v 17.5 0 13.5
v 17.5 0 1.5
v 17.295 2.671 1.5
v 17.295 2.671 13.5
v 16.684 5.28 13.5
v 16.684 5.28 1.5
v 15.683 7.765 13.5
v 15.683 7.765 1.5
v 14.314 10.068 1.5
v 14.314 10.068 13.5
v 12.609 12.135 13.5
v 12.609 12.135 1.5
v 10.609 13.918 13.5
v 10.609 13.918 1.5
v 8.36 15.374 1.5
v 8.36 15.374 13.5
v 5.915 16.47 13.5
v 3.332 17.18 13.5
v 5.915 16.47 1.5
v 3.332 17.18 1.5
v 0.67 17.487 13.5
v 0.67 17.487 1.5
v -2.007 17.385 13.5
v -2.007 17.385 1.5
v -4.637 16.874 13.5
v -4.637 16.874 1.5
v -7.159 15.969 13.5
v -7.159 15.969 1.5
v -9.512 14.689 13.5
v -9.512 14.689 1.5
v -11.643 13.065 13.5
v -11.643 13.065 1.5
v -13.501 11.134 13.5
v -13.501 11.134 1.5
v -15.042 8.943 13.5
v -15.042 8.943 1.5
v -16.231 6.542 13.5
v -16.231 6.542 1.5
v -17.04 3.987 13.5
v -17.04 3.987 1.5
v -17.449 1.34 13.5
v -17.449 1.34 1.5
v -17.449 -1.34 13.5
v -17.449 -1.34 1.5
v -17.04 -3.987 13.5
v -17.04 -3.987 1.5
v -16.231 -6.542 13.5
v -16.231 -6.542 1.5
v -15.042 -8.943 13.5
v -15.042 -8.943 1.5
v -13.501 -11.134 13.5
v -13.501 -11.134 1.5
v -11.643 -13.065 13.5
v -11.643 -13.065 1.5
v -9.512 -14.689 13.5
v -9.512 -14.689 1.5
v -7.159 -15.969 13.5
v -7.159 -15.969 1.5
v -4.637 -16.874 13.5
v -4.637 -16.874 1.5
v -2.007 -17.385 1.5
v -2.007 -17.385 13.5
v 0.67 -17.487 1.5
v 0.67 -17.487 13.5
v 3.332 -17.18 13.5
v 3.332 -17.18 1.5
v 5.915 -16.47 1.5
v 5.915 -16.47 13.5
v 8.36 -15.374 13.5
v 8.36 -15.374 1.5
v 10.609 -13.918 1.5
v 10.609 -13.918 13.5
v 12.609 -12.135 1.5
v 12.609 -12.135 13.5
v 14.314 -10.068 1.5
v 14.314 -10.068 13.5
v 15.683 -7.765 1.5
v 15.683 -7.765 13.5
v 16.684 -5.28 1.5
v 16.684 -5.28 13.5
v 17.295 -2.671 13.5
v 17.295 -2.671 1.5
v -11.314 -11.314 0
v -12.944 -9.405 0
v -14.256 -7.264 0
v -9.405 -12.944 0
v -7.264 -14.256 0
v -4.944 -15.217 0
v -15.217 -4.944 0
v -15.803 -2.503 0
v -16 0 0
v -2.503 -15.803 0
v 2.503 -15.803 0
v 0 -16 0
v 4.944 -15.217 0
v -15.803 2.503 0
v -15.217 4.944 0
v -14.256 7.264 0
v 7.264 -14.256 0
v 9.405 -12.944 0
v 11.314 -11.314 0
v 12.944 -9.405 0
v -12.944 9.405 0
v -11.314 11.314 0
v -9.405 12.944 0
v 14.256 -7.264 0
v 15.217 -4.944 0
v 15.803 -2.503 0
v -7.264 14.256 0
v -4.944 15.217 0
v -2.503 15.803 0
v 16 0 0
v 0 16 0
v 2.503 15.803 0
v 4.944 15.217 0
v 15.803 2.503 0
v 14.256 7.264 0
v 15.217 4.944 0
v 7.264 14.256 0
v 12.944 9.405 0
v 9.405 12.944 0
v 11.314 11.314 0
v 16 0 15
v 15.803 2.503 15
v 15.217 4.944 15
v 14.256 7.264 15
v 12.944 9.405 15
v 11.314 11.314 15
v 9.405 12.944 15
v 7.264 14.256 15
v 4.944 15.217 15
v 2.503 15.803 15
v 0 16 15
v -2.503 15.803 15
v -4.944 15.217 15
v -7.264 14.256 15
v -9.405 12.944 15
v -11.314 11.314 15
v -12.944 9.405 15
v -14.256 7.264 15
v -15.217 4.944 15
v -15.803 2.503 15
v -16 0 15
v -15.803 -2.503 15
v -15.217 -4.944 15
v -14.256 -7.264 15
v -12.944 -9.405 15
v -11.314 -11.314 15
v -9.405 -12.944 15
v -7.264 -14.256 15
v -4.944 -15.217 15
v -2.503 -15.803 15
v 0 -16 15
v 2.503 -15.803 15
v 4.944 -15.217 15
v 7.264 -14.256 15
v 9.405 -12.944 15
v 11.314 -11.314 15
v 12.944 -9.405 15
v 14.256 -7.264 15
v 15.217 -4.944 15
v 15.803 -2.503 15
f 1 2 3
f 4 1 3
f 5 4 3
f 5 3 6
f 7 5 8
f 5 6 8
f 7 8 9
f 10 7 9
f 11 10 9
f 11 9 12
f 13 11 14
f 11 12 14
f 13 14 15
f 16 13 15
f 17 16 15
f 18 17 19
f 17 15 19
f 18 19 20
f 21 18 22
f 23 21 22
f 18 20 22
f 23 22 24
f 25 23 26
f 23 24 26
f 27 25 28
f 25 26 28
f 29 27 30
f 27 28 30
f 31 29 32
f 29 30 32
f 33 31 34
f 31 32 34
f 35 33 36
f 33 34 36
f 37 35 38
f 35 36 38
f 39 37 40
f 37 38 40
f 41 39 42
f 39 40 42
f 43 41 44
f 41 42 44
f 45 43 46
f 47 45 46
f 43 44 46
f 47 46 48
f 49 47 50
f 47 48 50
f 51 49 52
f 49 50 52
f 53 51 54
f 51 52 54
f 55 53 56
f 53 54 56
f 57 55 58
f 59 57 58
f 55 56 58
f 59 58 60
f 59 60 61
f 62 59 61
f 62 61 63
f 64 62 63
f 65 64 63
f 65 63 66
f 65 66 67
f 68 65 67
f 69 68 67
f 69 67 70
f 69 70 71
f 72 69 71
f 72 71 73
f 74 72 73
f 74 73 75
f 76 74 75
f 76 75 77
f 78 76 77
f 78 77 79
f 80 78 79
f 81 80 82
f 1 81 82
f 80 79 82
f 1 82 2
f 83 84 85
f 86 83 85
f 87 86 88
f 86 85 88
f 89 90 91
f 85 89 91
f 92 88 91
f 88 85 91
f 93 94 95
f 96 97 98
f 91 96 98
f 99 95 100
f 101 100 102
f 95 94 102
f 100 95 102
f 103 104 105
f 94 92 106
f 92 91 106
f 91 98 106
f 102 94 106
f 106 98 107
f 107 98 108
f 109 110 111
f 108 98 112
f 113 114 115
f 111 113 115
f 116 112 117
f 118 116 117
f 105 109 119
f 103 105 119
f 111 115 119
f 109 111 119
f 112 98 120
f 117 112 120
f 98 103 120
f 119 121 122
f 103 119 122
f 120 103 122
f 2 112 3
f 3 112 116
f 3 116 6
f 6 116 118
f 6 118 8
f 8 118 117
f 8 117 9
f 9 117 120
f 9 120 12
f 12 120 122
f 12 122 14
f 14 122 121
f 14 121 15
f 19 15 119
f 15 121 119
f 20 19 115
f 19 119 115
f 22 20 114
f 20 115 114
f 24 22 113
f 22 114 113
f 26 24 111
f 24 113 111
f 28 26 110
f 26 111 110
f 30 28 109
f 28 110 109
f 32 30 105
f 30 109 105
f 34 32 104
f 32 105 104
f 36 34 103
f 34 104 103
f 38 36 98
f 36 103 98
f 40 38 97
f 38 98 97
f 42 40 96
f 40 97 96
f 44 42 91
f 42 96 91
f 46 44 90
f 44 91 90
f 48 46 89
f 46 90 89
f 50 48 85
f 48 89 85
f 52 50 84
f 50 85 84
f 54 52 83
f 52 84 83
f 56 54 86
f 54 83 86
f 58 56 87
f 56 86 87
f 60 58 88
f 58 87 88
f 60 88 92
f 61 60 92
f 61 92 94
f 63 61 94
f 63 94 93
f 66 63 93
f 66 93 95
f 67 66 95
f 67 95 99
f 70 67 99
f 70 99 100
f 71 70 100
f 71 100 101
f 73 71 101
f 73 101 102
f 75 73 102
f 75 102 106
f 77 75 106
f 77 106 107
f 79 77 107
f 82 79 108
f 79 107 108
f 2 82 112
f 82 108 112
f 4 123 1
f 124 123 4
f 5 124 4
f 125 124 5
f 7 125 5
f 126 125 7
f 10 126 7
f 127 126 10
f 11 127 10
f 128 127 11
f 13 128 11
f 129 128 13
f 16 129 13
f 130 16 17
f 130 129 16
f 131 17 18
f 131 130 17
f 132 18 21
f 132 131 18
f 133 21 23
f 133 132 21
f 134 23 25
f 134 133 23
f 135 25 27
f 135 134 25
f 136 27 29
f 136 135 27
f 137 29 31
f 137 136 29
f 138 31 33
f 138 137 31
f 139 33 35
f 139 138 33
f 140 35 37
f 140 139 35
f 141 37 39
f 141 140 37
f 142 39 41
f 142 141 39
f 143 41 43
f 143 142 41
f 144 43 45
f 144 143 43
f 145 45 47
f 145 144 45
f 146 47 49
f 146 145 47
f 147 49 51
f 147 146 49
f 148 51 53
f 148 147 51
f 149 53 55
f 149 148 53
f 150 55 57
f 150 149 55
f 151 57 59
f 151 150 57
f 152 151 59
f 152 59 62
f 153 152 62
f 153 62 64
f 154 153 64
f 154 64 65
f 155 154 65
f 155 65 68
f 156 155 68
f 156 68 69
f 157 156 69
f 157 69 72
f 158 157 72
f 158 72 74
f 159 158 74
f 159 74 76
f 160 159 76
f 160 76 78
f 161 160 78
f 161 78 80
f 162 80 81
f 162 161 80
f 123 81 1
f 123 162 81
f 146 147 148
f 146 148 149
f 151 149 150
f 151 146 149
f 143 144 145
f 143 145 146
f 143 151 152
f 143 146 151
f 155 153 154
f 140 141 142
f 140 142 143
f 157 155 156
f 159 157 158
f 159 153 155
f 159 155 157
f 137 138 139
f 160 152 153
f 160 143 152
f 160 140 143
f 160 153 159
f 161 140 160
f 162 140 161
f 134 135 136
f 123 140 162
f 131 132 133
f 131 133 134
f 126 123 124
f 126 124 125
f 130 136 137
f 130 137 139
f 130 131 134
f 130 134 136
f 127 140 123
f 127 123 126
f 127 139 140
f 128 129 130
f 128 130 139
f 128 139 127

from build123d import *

# Parameters (mm, degrees)
F0_R      = 1.5
F1_DEPTH  = 15
F0_R_2    = 17.5
F2_SIZE   = 1.5
F2_2_SIZE = 1.5


with BuildPart() as f1:
    # F0 (on Top) → F1 (new body)
    with BuildSketch(Plane.XY):
        with Locations((-49.0162223577, 3.6474848166)):
            Circle(F0_R)
    extrude(amount=F1_DEPTH)

    # F2
    f2_edges = [f1.edges().sort_by_distance(p)[0] for p in [
        (-50.516222, 3.647485, 15),
    ]]
    chamfer(f2_edges, length=F2_SIZE)


with BuildPart() as f1b:
    # F0 (on Top) → F1, piece 2 (new body)
    with BuildSketch(Plane.XY):
        Circle(F0_R_2)
    extrude(amount=F1_DEPTH)

    # F2#2
    f2_2_edges = [f1b.edges().sort_by_distance(p)[0] for p in [
        (-17.5, 0, 15),
        (17.5, 0, 7.5),
        (-17.5, 0, 0),
    ]]
    chamfer(f2_2_edges, length=F2_2_SIZE)


solid = f1b.part
